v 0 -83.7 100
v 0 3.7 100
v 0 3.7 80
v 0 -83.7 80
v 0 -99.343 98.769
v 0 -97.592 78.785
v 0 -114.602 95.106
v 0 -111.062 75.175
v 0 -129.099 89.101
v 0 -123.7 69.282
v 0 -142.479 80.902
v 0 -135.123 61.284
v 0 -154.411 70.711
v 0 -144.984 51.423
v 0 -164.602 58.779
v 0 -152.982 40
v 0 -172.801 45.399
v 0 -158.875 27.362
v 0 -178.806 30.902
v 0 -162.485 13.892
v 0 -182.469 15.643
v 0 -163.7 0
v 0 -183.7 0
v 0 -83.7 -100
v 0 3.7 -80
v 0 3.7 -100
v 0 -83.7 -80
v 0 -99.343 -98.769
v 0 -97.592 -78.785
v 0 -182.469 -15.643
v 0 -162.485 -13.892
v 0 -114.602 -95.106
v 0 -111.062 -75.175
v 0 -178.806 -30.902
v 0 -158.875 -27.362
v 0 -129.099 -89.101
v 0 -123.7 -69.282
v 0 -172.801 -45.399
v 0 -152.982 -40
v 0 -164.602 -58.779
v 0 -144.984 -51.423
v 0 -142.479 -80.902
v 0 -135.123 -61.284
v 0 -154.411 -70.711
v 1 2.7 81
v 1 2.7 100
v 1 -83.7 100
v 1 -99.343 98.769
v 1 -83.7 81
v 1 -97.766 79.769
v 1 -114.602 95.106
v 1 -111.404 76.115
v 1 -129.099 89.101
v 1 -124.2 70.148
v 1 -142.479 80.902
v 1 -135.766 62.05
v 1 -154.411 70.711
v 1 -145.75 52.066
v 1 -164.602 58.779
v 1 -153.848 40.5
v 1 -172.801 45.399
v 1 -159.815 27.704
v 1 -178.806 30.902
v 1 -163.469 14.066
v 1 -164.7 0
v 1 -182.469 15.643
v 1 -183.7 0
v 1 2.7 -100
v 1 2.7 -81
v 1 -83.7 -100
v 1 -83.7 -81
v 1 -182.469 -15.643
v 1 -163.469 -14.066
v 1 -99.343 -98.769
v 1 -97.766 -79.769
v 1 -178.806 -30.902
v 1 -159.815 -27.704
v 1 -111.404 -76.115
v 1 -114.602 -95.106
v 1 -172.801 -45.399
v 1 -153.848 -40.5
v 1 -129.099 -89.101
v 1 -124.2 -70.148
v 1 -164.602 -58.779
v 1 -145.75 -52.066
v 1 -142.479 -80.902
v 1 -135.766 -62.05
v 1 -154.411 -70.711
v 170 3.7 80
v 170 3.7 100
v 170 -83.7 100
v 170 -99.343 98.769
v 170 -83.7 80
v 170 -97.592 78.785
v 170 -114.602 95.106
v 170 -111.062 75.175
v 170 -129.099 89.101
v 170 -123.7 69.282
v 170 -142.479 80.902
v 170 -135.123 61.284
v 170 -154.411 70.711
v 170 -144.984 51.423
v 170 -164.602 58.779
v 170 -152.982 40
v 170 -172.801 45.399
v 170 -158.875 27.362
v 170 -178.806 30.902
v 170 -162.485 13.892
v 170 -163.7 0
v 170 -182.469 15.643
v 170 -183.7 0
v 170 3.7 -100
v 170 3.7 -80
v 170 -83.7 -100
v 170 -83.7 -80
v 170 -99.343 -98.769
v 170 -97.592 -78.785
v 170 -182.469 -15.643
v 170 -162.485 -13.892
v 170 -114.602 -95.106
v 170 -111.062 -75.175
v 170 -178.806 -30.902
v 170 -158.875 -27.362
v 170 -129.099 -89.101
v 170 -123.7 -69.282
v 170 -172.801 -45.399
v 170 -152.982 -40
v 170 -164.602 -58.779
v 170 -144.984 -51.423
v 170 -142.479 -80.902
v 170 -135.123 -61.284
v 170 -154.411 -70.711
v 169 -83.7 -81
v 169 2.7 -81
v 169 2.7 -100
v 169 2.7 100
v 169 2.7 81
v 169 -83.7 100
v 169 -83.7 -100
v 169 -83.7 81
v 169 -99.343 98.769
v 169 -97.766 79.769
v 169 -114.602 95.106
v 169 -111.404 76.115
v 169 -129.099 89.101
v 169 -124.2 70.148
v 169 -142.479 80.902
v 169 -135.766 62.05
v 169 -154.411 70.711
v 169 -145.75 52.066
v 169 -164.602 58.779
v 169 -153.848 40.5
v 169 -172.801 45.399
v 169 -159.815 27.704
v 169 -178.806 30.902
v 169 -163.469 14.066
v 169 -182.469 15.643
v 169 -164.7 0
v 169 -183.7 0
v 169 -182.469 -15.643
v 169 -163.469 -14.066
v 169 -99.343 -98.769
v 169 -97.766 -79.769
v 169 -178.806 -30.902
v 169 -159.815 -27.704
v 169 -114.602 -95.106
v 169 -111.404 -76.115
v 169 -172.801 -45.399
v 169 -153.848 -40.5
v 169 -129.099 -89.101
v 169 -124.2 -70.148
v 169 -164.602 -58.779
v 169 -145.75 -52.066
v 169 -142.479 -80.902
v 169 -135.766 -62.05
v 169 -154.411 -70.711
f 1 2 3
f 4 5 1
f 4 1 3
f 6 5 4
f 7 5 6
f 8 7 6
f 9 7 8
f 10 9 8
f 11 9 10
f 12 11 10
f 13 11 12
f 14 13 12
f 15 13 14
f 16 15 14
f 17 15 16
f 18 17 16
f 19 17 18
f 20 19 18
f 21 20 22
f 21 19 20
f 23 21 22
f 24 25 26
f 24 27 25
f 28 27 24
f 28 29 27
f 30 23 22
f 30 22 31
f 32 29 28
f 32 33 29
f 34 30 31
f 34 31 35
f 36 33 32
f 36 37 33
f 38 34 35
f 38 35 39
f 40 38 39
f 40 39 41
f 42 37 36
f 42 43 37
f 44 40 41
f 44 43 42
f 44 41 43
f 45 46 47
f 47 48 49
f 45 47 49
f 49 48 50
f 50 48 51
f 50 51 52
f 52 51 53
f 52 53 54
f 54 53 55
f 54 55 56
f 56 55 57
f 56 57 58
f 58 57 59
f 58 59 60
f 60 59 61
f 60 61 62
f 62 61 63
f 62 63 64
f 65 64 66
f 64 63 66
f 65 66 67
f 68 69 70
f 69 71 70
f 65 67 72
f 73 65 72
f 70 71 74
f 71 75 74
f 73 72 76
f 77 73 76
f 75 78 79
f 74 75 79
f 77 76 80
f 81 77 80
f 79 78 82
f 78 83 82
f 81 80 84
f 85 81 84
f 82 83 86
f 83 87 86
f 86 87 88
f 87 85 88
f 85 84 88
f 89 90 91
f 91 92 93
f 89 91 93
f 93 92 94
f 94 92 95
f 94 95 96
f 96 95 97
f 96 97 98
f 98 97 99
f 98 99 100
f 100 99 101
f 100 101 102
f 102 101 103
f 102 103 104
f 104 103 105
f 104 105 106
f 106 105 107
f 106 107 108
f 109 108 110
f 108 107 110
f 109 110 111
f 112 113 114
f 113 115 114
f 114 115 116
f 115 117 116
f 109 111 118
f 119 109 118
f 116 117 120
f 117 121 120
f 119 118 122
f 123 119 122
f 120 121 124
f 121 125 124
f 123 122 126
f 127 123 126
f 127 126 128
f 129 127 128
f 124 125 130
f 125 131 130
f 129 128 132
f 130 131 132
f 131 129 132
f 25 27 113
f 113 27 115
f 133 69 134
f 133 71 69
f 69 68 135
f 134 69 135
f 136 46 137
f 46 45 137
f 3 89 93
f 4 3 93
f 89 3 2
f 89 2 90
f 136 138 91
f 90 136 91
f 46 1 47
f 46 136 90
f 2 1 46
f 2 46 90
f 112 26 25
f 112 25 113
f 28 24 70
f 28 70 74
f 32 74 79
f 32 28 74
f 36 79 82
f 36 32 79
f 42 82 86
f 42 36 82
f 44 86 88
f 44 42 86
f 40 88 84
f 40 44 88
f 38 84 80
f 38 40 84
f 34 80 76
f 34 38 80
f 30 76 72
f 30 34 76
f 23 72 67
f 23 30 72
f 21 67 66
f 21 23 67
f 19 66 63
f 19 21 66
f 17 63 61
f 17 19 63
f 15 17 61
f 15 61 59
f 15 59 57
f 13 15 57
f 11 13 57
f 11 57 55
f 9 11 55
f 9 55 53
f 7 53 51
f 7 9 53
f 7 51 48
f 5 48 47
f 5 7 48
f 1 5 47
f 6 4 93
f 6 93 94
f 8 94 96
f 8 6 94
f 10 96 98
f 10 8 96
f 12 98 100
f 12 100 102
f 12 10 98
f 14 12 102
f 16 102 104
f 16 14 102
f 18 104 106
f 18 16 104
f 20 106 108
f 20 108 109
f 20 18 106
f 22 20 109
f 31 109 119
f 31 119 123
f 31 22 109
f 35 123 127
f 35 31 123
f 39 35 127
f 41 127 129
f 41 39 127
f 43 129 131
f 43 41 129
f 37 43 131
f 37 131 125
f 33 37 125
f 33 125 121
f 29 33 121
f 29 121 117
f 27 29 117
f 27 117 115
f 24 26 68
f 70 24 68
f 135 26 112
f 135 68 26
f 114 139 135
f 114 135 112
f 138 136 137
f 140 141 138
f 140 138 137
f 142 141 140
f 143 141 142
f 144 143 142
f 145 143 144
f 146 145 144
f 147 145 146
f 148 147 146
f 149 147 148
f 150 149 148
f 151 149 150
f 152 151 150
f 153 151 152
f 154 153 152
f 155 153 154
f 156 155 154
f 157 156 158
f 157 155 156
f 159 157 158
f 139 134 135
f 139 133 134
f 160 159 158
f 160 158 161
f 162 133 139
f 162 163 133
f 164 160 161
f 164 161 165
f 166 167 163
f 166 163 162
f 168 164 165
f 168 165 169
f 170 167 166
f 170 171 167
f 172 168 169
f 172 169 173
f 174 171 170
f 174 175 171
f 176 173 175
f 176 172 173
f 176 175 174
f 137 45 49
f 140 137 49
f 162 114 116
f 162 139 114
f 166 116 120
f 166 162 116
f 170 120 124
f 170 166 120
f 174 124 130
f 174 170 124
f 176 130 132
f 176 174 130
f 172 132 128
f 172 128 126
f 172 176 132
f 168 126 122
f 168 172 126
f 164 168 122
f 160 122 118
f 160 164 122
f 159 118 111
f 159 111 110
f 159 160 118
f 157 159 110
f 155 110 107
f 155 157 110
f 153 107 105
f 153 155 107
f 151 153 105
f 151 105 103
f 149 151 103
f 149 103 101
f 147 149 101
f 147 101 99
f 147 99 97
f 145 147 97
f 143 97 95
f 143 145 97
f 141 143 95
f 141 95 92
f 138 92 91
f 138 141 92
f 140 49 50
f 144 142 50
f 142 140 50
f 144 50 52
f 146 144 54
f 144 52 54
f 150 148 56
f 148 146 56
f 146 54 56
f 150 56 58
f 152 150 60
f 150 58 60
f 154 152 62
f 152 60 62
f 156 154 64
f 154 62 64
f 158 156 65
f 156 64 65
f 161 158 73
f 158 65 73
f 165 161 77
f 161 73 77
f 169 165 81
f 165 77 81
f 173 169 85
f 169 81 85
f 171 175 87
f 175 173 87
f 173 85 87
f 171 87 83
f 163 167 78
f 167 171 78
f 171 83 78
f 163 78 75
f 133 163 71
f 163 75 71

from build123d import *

# Parameters (mm, degrees)
SALIENTE_EXTRUIR1_DEPTH = 170
CROQUIS2_W              = 170
CROQUIS2_H              = 20.000000000000014
SALIENTE_EXTRUIR2_DEPTH = 3.7
VACIADO1_T              = -1


with BuildPart() as part:
    # Croquis1 → Saliente-Extruir1 (new body)
    with BuildSketch(Plane(origin=(0, 0, 0), x_dir=(0, 0, -1), z_dir=(1, 0, 0))):
        with BuildLine():
            Line((80, 0), (100, 0))
            Line((100, 0), (99.99999999999999, -83.7))
            ThreePointArc((99.99999999999999, -83.7), (70.71067811865474, -154.41067811865474), (1.125e-14, -183.7))
            ThreePointArc((1.125e-14, -183.7), (-70.71067811865473, -154.41067811865474), (-99.99999999999999, -83.70000000000002))
            Line((-99.99999999999999, -83.70000000000002), (-100, -1.225e-14))
            Line((-100, -1.225e-14), (-80, -9.8e-15))
            Line((-80, -9.8e-15), (-79.99999999999999, -83.70000000000002))
            ThreePointArc((-79.99999999999999, -83.70000000000002), (-56.568542494923804, -140.26854249492382), (-1.47e-14, -163.70000000000002))
            ThreePointArc((-1.47e-14, -163.70000000000002), (56.5685424949238, -140.26854249492382), (80, -83.70000000000002))
            Line((80, -83.70000000000002), (80, 0))
        make_face()
    extrude(amount=SALIENTE_EXTRUIR1_DEPTH)

    # Croquis2 → Saliente-Extruir2 (add)
    with BuildSketch(Plane(origin=(0, 0, 0), x_dir=(1, 0, 0), z_dir=(0, 1, 0))):
        with Locations((85, 90)):
            Rectangle(CROQUIS2_W, CROQUIS2_H)
        with Locations((85, -90)):
            Rectangle(CROQUIS2_W, CROQUIS2_H)
    extrude(amount=SALIENTE_EXTRUIR2_DEPTH)

    # Vaciado1
    vaciado1_openings = [part.faces().sort_by_distance(p)[0] for p in [
        (85, -183.7, 0),
        (85, -40, 100),
        (85, -40, -100),
    ]]
    offset(amount=VACIADO1_T, openings=vaciado1_openings, kind=Kind.INTERSECTION)


solid = part.part
